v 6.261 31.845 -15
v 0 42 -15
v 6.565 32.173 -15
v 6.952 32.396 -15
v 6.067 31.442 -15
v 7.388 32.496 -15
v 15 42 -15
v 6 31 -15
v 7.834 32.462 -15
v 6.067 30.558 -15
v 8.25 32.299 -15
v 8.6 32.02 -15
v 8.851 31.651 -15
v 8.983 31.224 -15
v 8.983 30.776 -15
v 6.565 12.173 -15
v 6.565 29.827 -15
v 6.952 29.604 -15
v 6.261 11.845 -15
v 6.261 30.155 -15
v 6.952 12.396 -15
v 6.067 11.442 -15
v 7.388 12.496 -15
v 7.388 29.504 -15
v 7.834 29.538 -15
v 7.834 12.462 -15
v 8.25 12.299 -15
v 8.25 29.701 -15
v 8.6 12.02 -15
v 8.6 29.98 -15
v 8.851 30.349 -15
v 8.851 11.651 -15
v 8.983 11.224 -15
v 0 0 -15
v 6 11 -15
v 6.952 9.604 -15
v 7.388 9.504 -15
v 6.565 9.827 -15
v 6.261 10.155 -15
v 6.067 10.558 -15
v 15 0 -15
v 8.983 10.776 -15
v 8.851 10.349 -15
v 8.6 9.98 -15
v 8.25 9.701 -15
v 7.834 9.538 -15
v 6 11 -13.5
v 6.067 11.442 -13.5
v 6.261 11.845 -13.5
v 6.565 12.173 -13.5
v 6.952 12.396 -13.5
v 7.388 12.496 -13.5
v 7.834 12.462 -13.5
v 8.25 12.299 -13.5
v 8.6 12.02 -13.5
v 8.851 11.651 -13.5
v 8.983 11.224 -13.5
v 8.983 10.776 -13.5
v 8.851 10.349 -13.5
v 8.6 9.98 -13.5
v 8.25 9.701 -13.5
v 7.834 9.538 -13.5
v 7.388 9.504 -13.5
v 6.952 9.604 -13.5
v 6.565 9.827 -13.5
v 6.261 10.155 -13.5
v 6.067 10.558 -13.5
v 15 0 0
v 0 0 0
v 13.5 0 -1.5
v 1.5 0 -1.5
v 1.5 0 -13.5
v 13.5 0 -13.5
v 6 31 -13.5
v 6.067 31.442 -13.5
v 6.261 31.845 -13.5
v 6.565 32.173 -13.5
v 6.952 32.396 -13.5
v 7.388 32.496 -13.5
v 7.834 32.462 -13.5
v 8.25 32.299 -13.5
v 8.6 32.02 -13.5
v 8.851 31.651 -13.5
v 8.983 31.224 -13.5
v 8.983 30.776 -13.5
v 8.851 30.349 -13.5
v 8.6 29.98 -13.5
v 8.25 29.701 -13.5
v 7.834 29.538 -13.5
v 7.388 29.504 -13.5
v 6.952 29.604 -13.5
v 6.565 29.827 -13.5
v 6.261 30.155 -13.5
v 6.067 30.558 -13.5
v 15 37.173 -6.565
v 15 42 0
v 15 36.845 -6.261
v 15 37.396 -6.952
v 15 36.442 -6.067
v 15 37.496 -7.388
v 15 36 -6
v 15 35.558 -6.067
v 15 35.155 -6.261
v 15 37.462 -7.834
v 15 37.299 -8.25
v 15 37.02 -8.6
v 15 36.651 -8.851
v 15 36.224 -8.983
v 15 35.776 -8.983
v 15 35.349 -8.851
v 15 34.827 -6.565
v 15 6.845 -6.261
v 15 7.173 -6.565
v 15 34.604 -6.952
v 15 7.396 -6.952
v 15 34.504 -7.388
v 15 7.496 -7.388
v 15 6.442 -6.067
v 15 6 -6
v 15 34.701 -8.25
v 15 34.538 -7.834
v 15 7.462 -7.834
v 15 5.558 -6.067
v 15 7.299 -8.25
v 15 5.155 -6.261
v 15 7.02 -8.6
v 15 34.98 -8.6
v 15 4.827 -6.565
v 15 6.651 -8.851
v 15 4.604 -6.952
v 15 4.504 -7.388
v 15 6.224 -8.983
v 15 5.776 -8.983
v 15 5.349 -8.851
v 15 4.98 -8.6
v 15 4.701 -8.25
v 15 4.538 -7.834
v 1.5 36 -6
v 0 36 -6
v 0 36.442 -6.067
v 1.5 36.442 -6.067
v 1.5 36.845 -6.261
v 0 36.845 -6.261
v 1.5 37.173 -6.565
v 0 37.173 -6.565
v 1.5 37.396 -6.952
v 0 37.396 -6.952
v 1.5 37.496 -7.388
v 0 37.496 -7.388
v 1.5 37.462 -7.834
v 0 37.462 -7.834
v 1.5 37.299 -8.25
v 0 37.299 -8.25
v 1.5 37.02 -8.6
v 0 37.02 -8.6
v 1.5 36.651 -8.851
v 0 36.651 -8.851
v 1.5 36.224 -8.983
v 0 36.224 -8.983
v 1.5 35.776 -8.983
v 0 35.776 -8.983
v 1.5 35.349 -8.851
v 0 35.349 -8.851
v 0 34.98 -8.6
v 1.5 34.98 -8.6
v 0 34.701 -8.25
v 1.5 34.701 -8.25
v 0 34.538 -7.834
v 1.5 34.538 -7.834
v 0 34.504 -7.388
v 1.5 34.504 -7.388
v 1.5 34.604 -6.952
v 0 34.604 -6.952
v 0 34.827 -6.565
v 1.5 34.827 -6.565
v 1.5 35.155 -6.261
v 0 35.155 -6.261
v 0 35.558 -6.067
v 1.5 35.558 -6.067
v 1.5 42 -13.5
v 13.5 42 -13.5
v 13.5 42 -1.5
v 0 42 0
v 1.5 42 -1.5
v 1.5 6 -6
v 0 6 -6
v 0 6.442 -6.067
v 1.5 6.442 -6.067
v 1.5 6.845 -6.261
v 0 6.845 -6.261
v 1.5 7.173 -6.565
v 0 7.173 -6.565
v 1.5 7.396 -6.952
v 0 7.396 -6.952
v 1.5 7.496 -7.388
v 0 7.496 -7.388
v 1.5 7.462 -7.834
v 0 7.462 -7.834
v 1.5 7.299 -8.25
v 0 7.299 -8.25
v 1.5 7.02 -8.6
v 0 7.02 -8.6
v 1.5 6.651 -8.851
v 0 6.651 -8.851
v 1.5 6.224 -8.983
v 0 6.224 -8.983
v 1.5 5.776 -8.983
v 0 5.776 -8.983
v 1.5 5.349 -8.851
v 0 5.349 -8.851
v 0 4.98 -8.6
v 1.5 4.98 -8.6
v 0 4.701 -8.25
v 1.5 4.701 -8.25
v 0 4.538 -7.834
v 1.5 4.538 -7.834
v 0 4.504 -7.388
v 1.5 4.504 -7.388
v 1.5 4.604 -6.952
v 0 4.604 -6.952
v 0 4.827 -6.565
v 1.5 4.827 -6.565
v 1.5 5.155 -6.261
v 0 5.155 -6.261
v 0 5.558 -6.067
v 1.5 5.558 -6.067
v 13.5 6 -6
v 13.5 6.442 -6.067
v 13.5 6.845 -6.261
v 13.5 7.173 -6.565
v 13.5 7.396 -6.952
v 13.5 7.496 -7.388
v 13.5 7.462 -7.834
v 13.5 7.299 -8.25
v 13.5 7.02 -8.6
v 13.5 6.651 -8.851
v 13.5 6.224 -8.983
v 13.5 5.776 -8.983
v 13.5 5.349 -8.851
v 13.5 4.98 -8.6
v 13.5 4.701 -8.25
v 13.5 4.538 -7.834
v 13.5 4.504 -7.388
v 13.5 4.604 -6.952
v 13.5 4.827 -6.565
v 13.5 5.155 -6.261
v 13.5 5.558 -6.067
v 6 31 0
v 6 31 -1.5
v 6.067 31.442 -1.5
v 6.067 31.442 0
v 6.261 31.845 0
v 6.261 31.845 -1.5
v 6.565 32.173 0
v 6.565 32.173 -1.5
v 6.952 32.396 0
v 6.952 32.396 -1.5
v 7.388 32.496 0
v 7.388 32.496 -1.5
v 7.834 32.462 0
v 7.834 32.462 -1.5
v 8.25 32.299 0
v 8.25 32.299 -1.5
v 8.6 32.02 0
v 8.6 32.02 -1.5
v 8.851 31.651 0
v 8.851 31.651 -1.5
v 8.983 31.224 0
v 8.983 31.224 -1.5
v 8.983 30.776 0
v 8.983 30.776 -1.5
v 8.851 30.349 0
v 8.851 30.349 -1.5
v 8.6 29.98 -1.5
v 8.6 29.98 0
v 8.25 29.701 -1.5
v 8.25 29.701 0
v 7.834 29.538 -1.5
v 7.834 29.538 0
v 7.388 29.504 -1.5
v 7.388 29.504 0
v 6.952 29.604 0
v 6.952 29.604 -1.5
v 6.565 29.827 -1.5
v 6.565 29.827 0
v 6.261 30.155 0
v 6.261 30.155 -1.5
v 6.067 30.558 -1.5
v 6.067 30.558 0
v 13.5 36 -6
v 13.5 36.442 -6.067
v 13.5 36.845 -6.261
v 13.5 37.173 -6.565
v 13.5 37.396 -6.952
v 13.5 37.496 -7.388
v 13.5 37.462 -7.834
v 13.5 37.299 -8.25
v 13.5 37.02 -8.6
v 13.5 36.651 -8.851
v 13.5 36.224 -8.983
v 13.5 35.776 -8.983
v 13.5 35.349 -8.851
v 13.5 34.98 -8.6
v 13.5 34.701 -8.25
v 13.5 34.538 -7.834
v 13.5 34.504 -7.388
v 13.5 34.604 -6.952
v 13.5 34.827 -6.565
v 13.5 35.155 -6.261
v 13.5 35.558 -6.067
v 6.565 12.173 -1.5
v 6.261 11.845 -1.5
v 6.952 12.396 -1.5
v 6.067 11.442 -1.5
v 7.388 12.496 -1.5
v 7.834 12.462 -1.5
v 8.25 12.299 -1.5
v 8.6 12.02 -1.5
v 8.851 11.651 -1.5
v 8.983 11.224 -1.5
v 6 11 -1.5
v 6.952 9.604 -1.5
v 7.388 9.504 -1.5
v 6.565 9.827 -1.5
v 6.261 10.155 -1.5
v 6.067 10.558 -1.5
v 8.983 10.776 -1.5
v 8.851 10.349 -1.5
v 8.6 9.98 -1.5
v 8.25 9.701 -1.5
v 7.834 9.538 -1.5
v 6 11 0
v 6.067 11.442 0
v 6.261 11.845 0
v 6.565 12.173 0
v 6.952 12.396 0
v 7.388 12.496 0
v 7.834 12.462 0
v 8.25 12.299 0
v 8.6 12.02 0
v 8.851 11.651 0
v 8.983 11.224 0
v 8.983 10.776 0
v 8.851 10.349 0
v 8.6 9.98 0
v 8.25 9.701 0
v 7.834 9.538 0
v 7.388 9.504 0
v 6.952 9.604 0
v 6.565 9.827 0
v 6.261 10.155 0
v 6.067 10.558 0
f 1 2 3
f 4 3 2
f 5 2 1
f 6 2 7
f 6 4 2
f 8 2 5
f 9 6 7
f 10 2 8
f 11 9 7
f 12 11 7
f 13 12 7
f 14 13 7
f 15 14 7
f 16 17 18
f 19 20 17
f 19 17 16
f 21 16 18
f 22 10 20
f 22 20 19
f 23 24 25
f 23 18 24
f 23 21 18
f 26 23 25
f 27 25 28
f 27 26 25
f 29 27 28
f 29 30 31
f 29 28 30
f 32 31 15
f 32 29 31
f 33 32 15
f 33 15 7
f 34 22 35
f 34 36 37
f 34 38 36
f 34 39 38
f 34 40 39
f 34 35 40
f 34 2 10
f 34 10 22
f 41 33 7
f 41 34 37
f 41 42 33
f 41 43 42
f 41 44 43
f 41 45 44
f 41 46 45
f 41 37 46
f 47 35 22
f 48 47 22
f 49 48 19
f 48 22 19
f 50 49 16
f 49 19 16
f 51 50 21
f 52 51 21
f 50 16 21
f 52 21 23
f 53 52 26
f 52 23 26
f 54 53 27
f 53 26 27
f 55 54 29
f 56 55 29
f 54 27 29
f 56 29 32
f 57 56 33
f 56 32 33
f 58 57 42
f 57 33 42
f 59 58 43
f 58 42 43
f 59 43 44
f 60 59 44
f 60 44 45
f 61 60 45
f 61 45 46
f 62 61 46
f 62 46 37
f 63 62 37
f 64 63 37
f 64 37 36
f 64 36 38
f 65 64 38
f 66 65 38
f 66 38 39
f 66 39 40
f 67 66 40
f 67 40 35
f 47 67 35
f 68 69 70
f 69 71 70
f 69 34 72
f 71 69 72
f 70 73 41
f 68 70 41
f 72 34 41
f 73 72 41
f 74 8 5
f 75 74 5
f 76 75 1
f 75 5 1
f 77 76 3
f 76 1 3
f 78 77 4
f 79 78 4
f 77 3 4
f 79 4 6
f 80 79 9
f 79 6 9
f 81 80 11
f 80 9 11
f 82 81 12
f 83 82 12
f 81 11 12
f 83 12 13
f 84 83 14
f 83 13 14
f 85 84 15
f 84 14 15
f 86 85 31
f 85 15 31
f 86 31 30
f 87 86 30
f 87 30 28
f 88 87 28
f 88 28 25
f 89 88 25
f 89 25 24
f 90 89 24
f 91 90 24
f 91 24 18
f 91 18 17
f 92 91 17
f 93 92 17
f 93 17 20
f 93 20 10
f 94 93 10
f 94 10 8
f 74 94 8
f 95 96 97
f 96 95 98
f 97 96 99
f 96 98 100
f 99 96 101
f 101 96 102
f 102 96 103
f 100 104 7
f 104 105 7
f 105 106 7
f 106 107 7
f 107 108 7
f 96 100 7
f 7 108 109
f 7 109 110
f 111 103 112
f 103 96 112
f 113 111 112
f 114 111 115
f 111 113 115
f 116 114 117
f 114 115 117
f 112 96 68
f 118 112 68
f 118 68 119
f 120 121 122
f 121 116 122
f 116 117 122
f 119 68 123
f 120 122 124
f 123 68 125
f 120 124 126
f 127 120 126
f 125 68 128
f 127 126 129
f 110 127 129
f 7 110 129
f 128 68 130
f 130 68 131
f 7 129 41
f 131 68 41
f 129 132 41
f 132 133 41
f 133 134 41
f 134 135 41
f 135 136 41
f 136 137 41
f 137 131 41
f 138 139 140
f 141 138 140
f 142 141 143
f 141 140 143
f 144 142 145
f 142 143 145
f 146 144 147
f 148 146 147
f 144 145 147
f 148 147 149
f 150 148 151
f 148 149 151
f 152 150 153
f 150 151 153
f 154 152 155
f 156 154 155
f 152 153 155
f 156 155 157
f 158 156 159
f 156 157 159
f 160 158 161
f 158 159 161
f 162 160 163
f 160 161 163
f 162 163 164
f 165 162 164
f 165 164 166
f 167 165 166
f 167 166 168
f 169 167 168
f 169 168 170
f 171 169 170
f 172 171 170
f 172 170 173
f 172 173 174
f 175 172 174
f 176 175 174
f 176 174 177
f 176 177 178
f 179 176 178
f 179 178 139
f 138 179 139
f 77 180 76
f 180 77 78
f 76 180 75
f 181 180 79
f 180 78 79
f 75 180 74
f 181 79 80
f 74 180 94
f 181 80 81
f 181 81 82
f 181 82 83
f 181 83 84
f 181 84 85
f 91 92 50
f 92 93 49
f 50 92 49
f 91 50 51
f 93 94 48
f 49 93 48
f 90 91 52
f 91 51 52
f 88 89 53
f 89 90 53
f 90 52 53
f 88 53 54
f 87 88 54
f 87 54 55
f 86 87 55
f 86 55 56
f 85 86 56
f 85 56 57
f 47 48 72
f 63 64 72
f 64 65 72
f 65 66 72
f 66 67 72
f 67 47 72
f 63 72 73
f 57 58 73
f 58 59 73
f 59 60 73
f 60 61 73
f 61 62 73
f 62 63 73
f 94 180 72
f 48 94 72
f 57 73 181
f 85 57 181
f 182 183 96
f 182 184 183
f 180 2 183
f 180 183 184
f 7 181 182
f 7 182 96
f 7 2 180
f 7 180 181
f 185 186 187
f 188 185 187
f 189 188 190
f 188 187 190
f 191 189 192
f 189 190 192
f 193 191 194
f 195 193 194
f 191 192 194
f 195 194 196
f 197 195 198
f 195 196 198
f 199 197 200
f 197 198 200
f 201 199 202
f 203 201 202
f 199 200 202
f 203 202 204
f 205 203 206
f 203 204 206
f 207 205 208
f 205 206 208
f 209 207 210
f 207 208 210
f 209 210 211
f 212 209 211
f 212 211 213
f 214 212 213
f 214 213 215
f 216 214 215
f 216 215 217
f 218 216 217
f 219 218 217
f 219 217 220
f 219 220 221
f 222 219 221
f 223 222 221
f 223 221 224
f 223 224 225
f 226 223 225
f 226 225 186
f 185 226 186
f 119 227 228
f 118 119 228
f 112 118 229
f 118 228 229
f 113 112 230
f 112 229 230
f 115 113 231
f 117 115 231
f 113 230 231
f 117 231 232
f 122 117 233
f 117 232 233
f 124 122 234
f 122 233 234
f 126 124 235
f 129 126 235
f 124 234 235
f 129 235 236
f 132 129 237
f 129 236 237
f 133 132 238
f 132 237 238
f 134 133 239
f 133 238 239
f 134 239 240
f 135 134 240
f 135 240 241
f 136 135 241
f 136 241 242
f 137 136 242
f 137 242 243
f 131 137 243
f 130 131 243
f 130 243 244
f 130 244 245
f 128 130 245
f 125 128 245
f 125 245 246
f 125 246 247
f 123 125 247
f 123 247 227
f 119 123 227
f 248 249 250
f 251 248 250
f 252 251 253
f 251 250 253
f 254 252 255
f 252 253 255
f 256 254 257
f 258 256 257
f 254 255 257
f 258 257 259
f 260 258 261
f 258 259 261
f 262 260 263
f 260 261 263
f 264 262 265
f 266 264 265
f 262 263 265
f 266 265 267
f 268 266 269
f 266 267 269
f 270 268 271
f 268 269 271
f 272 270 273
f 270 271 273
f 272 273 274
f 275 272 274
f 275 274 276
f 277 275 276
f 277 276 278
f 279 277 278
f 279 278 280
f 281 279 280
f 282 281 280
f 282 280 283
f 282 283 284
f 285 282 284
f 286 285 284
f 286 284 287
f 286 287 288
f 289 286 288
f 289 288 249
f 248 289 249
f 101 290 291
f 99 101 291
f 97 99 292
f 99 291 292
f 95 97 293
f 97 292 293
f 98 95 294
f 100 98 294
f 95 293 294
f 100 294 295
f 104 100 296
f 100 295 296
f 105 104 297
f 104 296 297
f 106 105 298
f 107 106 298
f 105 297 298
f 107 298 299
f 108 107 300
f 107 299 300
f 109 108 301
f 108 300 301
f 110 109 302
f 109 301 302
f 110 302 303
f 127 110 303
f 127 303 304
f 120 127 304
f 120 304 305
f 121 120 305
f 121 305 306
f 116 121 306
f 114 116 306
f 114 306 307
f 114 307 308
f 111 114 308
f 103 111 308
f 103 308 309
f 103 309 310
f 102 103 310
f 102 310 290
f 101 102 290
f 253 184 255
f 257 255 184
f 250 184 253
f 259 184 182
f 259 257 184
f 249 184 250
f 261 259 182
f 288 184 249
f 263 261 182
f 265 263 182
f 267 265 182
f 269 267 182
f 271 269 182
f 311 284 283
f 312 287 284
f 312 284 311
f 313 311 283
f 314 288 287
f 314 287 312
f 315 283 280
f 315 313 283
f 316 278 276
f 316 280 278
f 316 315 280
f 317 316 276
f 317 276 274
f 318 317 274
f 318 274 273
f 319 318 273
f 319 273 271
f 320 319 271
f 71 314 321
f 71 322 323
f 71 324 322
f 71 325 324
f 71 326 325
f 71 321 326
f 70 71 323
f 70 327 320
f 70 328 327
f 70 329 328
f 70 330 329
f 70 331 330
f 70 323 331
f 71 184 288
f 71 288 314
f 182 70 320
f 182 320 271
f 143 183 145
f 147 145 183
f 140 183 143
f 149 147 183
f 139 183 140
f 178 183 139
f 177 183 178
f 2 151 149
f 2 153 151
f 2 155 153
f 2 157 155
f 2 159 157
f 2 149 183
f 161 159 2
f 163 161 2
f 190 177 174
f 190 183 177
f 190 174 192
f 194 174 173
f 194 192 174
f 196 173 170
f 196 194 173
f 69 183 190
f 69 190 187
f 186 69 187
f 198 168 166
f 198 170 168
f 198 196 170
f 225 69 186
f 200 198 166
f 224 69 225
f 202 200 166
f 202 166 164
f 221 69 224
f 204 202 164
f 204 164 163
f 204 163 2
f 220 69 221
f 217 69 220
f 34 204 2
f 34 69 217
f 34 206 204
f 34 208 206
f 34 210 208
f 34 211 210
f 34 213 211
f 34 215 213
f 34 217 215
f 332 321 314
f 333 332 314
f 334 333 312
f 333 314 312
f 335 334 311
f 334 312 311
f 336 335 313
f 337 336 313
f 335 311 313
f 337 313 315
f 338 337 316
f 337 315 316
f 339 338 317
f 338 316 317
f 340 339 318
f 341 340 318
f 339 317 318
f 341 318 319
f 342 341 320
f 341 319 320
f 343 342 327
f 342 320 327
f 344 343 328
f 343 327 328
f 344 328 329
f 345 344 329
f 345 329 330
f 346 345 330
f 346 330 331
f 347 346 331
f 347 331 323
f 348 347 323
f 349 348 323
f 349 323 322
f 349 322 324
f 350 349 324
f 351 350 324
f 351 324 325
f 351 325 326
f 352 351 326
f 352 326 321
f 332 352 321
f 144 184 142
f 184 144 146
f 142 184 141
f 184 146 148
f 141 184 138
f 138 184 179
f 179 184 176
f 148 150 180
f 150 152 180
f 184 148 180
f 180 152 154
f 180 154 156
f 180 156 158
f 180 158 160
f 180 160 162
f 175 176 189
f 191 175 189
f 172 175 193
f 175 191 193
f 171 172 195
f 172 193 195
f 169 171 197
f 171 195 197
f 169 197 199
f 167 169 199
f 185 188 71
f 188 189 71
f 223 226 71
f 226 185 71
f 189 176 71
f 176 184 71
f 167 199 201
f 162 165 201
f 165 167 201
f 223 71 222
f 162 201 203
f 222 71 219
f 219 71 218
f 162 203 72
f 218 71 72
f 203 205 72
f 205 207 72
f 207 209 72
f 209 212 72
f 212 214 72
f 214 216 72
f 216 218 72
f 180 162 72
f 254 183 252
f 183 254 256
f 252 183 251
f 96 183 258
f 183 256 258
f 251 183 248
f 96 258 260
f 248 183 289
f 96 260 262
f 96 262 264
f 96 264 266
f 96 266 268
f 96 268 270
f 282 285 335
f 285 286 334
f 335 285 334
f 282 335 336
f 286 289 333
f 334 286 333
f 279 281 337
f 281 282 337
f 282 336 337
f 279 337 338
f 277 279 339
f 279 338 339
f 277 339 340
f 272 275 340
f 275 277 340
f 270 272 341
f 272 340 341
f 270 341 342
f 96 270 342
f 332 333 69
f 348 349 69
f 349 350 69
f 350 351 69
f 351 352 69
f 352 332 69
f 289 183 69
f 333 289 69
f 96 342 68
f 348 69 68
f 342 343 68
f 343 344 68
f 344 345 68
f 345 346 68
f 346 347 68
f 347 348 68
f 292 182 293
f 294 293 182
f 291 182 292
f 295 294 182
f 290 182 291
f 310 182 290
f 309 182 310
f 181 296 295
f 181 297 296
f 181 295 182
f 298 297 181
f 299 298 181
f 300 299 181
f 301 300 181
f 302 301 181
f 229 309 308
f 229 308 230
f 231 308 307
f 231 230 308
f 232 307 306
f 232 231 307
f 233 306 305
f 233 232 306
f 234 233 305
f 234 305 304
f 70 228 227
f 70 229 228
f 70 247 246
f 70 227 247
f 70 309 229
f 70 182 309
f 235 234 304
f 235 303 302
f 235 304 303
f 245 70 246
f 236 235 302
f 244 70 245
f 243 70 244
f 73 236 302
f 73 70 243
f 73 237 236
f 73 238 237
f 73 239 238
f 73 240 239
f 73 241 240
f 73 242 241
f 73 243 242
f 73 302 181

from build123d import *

# Parameters (mm, degrees)
SKETCH1_W           = 15
SKETCH1_H           = 15
SKETCH1_W_2         = 12
SKETCH1_H_2         = 12
EXTRUDE_THIN1_DEPTH = 42
SKETCH2_R           = 1.5
CUT_EXTRUDE1_DEPTH  = 16
SKETCH3_R           = 1.5
CUT_EXTRUDE2_DEPTH  = 16


with BuildPart() as part:
    # Sketch1 → Extrude-Thin1 (new body)
    with BuildSketch(Plane(origin=(0, 0, 0), x_dir=(1, 0, 0), z_dir=(0, 1, 0))):
        with Locations((7.5, 7.5)):
            Rectangle(SKETCH1_W, SKETCH1_H)
        with Locations((7.5, 7.5)):
            Rectangle(SKETCH1_W_2, SKETCH1_H_2, mode=Mode.SUBTRACT)
    extrude(amount=EXTRUDE_THIN1_DEPTH)

    # Sketch2 → Cut-Extrude1 (cut, through all)
    with BuildSketch(Plane.ZY):
        with Locations((-7.5, 36)):
            Circle(SKETCH2_R)
        with Locations((-7.5, 6)):
            Circle(SKETCH2_R)
    extrude(amount=-CUT_EXTRUDE1_DEPTH, mode=Mode.SUBTRACT)

    # Sketch3 → Cut-Extrude2 (cut, through all)
    with BuildSketch(Plane(origin=(0, 0, -15), x_dir=(-1, 0, 0), z_dir=(0, 0, -1))):
        with Locations((-7.5, 31)):
            Circle(SKETCH3_R)
        with Locations((-7.5, 11)):
            Circle(SKETCH3_R)
    extrude(amount=-CUT_EXTRUDE2_DEPTH, mode=Mode.SUBTRACT)


solid = part.part
